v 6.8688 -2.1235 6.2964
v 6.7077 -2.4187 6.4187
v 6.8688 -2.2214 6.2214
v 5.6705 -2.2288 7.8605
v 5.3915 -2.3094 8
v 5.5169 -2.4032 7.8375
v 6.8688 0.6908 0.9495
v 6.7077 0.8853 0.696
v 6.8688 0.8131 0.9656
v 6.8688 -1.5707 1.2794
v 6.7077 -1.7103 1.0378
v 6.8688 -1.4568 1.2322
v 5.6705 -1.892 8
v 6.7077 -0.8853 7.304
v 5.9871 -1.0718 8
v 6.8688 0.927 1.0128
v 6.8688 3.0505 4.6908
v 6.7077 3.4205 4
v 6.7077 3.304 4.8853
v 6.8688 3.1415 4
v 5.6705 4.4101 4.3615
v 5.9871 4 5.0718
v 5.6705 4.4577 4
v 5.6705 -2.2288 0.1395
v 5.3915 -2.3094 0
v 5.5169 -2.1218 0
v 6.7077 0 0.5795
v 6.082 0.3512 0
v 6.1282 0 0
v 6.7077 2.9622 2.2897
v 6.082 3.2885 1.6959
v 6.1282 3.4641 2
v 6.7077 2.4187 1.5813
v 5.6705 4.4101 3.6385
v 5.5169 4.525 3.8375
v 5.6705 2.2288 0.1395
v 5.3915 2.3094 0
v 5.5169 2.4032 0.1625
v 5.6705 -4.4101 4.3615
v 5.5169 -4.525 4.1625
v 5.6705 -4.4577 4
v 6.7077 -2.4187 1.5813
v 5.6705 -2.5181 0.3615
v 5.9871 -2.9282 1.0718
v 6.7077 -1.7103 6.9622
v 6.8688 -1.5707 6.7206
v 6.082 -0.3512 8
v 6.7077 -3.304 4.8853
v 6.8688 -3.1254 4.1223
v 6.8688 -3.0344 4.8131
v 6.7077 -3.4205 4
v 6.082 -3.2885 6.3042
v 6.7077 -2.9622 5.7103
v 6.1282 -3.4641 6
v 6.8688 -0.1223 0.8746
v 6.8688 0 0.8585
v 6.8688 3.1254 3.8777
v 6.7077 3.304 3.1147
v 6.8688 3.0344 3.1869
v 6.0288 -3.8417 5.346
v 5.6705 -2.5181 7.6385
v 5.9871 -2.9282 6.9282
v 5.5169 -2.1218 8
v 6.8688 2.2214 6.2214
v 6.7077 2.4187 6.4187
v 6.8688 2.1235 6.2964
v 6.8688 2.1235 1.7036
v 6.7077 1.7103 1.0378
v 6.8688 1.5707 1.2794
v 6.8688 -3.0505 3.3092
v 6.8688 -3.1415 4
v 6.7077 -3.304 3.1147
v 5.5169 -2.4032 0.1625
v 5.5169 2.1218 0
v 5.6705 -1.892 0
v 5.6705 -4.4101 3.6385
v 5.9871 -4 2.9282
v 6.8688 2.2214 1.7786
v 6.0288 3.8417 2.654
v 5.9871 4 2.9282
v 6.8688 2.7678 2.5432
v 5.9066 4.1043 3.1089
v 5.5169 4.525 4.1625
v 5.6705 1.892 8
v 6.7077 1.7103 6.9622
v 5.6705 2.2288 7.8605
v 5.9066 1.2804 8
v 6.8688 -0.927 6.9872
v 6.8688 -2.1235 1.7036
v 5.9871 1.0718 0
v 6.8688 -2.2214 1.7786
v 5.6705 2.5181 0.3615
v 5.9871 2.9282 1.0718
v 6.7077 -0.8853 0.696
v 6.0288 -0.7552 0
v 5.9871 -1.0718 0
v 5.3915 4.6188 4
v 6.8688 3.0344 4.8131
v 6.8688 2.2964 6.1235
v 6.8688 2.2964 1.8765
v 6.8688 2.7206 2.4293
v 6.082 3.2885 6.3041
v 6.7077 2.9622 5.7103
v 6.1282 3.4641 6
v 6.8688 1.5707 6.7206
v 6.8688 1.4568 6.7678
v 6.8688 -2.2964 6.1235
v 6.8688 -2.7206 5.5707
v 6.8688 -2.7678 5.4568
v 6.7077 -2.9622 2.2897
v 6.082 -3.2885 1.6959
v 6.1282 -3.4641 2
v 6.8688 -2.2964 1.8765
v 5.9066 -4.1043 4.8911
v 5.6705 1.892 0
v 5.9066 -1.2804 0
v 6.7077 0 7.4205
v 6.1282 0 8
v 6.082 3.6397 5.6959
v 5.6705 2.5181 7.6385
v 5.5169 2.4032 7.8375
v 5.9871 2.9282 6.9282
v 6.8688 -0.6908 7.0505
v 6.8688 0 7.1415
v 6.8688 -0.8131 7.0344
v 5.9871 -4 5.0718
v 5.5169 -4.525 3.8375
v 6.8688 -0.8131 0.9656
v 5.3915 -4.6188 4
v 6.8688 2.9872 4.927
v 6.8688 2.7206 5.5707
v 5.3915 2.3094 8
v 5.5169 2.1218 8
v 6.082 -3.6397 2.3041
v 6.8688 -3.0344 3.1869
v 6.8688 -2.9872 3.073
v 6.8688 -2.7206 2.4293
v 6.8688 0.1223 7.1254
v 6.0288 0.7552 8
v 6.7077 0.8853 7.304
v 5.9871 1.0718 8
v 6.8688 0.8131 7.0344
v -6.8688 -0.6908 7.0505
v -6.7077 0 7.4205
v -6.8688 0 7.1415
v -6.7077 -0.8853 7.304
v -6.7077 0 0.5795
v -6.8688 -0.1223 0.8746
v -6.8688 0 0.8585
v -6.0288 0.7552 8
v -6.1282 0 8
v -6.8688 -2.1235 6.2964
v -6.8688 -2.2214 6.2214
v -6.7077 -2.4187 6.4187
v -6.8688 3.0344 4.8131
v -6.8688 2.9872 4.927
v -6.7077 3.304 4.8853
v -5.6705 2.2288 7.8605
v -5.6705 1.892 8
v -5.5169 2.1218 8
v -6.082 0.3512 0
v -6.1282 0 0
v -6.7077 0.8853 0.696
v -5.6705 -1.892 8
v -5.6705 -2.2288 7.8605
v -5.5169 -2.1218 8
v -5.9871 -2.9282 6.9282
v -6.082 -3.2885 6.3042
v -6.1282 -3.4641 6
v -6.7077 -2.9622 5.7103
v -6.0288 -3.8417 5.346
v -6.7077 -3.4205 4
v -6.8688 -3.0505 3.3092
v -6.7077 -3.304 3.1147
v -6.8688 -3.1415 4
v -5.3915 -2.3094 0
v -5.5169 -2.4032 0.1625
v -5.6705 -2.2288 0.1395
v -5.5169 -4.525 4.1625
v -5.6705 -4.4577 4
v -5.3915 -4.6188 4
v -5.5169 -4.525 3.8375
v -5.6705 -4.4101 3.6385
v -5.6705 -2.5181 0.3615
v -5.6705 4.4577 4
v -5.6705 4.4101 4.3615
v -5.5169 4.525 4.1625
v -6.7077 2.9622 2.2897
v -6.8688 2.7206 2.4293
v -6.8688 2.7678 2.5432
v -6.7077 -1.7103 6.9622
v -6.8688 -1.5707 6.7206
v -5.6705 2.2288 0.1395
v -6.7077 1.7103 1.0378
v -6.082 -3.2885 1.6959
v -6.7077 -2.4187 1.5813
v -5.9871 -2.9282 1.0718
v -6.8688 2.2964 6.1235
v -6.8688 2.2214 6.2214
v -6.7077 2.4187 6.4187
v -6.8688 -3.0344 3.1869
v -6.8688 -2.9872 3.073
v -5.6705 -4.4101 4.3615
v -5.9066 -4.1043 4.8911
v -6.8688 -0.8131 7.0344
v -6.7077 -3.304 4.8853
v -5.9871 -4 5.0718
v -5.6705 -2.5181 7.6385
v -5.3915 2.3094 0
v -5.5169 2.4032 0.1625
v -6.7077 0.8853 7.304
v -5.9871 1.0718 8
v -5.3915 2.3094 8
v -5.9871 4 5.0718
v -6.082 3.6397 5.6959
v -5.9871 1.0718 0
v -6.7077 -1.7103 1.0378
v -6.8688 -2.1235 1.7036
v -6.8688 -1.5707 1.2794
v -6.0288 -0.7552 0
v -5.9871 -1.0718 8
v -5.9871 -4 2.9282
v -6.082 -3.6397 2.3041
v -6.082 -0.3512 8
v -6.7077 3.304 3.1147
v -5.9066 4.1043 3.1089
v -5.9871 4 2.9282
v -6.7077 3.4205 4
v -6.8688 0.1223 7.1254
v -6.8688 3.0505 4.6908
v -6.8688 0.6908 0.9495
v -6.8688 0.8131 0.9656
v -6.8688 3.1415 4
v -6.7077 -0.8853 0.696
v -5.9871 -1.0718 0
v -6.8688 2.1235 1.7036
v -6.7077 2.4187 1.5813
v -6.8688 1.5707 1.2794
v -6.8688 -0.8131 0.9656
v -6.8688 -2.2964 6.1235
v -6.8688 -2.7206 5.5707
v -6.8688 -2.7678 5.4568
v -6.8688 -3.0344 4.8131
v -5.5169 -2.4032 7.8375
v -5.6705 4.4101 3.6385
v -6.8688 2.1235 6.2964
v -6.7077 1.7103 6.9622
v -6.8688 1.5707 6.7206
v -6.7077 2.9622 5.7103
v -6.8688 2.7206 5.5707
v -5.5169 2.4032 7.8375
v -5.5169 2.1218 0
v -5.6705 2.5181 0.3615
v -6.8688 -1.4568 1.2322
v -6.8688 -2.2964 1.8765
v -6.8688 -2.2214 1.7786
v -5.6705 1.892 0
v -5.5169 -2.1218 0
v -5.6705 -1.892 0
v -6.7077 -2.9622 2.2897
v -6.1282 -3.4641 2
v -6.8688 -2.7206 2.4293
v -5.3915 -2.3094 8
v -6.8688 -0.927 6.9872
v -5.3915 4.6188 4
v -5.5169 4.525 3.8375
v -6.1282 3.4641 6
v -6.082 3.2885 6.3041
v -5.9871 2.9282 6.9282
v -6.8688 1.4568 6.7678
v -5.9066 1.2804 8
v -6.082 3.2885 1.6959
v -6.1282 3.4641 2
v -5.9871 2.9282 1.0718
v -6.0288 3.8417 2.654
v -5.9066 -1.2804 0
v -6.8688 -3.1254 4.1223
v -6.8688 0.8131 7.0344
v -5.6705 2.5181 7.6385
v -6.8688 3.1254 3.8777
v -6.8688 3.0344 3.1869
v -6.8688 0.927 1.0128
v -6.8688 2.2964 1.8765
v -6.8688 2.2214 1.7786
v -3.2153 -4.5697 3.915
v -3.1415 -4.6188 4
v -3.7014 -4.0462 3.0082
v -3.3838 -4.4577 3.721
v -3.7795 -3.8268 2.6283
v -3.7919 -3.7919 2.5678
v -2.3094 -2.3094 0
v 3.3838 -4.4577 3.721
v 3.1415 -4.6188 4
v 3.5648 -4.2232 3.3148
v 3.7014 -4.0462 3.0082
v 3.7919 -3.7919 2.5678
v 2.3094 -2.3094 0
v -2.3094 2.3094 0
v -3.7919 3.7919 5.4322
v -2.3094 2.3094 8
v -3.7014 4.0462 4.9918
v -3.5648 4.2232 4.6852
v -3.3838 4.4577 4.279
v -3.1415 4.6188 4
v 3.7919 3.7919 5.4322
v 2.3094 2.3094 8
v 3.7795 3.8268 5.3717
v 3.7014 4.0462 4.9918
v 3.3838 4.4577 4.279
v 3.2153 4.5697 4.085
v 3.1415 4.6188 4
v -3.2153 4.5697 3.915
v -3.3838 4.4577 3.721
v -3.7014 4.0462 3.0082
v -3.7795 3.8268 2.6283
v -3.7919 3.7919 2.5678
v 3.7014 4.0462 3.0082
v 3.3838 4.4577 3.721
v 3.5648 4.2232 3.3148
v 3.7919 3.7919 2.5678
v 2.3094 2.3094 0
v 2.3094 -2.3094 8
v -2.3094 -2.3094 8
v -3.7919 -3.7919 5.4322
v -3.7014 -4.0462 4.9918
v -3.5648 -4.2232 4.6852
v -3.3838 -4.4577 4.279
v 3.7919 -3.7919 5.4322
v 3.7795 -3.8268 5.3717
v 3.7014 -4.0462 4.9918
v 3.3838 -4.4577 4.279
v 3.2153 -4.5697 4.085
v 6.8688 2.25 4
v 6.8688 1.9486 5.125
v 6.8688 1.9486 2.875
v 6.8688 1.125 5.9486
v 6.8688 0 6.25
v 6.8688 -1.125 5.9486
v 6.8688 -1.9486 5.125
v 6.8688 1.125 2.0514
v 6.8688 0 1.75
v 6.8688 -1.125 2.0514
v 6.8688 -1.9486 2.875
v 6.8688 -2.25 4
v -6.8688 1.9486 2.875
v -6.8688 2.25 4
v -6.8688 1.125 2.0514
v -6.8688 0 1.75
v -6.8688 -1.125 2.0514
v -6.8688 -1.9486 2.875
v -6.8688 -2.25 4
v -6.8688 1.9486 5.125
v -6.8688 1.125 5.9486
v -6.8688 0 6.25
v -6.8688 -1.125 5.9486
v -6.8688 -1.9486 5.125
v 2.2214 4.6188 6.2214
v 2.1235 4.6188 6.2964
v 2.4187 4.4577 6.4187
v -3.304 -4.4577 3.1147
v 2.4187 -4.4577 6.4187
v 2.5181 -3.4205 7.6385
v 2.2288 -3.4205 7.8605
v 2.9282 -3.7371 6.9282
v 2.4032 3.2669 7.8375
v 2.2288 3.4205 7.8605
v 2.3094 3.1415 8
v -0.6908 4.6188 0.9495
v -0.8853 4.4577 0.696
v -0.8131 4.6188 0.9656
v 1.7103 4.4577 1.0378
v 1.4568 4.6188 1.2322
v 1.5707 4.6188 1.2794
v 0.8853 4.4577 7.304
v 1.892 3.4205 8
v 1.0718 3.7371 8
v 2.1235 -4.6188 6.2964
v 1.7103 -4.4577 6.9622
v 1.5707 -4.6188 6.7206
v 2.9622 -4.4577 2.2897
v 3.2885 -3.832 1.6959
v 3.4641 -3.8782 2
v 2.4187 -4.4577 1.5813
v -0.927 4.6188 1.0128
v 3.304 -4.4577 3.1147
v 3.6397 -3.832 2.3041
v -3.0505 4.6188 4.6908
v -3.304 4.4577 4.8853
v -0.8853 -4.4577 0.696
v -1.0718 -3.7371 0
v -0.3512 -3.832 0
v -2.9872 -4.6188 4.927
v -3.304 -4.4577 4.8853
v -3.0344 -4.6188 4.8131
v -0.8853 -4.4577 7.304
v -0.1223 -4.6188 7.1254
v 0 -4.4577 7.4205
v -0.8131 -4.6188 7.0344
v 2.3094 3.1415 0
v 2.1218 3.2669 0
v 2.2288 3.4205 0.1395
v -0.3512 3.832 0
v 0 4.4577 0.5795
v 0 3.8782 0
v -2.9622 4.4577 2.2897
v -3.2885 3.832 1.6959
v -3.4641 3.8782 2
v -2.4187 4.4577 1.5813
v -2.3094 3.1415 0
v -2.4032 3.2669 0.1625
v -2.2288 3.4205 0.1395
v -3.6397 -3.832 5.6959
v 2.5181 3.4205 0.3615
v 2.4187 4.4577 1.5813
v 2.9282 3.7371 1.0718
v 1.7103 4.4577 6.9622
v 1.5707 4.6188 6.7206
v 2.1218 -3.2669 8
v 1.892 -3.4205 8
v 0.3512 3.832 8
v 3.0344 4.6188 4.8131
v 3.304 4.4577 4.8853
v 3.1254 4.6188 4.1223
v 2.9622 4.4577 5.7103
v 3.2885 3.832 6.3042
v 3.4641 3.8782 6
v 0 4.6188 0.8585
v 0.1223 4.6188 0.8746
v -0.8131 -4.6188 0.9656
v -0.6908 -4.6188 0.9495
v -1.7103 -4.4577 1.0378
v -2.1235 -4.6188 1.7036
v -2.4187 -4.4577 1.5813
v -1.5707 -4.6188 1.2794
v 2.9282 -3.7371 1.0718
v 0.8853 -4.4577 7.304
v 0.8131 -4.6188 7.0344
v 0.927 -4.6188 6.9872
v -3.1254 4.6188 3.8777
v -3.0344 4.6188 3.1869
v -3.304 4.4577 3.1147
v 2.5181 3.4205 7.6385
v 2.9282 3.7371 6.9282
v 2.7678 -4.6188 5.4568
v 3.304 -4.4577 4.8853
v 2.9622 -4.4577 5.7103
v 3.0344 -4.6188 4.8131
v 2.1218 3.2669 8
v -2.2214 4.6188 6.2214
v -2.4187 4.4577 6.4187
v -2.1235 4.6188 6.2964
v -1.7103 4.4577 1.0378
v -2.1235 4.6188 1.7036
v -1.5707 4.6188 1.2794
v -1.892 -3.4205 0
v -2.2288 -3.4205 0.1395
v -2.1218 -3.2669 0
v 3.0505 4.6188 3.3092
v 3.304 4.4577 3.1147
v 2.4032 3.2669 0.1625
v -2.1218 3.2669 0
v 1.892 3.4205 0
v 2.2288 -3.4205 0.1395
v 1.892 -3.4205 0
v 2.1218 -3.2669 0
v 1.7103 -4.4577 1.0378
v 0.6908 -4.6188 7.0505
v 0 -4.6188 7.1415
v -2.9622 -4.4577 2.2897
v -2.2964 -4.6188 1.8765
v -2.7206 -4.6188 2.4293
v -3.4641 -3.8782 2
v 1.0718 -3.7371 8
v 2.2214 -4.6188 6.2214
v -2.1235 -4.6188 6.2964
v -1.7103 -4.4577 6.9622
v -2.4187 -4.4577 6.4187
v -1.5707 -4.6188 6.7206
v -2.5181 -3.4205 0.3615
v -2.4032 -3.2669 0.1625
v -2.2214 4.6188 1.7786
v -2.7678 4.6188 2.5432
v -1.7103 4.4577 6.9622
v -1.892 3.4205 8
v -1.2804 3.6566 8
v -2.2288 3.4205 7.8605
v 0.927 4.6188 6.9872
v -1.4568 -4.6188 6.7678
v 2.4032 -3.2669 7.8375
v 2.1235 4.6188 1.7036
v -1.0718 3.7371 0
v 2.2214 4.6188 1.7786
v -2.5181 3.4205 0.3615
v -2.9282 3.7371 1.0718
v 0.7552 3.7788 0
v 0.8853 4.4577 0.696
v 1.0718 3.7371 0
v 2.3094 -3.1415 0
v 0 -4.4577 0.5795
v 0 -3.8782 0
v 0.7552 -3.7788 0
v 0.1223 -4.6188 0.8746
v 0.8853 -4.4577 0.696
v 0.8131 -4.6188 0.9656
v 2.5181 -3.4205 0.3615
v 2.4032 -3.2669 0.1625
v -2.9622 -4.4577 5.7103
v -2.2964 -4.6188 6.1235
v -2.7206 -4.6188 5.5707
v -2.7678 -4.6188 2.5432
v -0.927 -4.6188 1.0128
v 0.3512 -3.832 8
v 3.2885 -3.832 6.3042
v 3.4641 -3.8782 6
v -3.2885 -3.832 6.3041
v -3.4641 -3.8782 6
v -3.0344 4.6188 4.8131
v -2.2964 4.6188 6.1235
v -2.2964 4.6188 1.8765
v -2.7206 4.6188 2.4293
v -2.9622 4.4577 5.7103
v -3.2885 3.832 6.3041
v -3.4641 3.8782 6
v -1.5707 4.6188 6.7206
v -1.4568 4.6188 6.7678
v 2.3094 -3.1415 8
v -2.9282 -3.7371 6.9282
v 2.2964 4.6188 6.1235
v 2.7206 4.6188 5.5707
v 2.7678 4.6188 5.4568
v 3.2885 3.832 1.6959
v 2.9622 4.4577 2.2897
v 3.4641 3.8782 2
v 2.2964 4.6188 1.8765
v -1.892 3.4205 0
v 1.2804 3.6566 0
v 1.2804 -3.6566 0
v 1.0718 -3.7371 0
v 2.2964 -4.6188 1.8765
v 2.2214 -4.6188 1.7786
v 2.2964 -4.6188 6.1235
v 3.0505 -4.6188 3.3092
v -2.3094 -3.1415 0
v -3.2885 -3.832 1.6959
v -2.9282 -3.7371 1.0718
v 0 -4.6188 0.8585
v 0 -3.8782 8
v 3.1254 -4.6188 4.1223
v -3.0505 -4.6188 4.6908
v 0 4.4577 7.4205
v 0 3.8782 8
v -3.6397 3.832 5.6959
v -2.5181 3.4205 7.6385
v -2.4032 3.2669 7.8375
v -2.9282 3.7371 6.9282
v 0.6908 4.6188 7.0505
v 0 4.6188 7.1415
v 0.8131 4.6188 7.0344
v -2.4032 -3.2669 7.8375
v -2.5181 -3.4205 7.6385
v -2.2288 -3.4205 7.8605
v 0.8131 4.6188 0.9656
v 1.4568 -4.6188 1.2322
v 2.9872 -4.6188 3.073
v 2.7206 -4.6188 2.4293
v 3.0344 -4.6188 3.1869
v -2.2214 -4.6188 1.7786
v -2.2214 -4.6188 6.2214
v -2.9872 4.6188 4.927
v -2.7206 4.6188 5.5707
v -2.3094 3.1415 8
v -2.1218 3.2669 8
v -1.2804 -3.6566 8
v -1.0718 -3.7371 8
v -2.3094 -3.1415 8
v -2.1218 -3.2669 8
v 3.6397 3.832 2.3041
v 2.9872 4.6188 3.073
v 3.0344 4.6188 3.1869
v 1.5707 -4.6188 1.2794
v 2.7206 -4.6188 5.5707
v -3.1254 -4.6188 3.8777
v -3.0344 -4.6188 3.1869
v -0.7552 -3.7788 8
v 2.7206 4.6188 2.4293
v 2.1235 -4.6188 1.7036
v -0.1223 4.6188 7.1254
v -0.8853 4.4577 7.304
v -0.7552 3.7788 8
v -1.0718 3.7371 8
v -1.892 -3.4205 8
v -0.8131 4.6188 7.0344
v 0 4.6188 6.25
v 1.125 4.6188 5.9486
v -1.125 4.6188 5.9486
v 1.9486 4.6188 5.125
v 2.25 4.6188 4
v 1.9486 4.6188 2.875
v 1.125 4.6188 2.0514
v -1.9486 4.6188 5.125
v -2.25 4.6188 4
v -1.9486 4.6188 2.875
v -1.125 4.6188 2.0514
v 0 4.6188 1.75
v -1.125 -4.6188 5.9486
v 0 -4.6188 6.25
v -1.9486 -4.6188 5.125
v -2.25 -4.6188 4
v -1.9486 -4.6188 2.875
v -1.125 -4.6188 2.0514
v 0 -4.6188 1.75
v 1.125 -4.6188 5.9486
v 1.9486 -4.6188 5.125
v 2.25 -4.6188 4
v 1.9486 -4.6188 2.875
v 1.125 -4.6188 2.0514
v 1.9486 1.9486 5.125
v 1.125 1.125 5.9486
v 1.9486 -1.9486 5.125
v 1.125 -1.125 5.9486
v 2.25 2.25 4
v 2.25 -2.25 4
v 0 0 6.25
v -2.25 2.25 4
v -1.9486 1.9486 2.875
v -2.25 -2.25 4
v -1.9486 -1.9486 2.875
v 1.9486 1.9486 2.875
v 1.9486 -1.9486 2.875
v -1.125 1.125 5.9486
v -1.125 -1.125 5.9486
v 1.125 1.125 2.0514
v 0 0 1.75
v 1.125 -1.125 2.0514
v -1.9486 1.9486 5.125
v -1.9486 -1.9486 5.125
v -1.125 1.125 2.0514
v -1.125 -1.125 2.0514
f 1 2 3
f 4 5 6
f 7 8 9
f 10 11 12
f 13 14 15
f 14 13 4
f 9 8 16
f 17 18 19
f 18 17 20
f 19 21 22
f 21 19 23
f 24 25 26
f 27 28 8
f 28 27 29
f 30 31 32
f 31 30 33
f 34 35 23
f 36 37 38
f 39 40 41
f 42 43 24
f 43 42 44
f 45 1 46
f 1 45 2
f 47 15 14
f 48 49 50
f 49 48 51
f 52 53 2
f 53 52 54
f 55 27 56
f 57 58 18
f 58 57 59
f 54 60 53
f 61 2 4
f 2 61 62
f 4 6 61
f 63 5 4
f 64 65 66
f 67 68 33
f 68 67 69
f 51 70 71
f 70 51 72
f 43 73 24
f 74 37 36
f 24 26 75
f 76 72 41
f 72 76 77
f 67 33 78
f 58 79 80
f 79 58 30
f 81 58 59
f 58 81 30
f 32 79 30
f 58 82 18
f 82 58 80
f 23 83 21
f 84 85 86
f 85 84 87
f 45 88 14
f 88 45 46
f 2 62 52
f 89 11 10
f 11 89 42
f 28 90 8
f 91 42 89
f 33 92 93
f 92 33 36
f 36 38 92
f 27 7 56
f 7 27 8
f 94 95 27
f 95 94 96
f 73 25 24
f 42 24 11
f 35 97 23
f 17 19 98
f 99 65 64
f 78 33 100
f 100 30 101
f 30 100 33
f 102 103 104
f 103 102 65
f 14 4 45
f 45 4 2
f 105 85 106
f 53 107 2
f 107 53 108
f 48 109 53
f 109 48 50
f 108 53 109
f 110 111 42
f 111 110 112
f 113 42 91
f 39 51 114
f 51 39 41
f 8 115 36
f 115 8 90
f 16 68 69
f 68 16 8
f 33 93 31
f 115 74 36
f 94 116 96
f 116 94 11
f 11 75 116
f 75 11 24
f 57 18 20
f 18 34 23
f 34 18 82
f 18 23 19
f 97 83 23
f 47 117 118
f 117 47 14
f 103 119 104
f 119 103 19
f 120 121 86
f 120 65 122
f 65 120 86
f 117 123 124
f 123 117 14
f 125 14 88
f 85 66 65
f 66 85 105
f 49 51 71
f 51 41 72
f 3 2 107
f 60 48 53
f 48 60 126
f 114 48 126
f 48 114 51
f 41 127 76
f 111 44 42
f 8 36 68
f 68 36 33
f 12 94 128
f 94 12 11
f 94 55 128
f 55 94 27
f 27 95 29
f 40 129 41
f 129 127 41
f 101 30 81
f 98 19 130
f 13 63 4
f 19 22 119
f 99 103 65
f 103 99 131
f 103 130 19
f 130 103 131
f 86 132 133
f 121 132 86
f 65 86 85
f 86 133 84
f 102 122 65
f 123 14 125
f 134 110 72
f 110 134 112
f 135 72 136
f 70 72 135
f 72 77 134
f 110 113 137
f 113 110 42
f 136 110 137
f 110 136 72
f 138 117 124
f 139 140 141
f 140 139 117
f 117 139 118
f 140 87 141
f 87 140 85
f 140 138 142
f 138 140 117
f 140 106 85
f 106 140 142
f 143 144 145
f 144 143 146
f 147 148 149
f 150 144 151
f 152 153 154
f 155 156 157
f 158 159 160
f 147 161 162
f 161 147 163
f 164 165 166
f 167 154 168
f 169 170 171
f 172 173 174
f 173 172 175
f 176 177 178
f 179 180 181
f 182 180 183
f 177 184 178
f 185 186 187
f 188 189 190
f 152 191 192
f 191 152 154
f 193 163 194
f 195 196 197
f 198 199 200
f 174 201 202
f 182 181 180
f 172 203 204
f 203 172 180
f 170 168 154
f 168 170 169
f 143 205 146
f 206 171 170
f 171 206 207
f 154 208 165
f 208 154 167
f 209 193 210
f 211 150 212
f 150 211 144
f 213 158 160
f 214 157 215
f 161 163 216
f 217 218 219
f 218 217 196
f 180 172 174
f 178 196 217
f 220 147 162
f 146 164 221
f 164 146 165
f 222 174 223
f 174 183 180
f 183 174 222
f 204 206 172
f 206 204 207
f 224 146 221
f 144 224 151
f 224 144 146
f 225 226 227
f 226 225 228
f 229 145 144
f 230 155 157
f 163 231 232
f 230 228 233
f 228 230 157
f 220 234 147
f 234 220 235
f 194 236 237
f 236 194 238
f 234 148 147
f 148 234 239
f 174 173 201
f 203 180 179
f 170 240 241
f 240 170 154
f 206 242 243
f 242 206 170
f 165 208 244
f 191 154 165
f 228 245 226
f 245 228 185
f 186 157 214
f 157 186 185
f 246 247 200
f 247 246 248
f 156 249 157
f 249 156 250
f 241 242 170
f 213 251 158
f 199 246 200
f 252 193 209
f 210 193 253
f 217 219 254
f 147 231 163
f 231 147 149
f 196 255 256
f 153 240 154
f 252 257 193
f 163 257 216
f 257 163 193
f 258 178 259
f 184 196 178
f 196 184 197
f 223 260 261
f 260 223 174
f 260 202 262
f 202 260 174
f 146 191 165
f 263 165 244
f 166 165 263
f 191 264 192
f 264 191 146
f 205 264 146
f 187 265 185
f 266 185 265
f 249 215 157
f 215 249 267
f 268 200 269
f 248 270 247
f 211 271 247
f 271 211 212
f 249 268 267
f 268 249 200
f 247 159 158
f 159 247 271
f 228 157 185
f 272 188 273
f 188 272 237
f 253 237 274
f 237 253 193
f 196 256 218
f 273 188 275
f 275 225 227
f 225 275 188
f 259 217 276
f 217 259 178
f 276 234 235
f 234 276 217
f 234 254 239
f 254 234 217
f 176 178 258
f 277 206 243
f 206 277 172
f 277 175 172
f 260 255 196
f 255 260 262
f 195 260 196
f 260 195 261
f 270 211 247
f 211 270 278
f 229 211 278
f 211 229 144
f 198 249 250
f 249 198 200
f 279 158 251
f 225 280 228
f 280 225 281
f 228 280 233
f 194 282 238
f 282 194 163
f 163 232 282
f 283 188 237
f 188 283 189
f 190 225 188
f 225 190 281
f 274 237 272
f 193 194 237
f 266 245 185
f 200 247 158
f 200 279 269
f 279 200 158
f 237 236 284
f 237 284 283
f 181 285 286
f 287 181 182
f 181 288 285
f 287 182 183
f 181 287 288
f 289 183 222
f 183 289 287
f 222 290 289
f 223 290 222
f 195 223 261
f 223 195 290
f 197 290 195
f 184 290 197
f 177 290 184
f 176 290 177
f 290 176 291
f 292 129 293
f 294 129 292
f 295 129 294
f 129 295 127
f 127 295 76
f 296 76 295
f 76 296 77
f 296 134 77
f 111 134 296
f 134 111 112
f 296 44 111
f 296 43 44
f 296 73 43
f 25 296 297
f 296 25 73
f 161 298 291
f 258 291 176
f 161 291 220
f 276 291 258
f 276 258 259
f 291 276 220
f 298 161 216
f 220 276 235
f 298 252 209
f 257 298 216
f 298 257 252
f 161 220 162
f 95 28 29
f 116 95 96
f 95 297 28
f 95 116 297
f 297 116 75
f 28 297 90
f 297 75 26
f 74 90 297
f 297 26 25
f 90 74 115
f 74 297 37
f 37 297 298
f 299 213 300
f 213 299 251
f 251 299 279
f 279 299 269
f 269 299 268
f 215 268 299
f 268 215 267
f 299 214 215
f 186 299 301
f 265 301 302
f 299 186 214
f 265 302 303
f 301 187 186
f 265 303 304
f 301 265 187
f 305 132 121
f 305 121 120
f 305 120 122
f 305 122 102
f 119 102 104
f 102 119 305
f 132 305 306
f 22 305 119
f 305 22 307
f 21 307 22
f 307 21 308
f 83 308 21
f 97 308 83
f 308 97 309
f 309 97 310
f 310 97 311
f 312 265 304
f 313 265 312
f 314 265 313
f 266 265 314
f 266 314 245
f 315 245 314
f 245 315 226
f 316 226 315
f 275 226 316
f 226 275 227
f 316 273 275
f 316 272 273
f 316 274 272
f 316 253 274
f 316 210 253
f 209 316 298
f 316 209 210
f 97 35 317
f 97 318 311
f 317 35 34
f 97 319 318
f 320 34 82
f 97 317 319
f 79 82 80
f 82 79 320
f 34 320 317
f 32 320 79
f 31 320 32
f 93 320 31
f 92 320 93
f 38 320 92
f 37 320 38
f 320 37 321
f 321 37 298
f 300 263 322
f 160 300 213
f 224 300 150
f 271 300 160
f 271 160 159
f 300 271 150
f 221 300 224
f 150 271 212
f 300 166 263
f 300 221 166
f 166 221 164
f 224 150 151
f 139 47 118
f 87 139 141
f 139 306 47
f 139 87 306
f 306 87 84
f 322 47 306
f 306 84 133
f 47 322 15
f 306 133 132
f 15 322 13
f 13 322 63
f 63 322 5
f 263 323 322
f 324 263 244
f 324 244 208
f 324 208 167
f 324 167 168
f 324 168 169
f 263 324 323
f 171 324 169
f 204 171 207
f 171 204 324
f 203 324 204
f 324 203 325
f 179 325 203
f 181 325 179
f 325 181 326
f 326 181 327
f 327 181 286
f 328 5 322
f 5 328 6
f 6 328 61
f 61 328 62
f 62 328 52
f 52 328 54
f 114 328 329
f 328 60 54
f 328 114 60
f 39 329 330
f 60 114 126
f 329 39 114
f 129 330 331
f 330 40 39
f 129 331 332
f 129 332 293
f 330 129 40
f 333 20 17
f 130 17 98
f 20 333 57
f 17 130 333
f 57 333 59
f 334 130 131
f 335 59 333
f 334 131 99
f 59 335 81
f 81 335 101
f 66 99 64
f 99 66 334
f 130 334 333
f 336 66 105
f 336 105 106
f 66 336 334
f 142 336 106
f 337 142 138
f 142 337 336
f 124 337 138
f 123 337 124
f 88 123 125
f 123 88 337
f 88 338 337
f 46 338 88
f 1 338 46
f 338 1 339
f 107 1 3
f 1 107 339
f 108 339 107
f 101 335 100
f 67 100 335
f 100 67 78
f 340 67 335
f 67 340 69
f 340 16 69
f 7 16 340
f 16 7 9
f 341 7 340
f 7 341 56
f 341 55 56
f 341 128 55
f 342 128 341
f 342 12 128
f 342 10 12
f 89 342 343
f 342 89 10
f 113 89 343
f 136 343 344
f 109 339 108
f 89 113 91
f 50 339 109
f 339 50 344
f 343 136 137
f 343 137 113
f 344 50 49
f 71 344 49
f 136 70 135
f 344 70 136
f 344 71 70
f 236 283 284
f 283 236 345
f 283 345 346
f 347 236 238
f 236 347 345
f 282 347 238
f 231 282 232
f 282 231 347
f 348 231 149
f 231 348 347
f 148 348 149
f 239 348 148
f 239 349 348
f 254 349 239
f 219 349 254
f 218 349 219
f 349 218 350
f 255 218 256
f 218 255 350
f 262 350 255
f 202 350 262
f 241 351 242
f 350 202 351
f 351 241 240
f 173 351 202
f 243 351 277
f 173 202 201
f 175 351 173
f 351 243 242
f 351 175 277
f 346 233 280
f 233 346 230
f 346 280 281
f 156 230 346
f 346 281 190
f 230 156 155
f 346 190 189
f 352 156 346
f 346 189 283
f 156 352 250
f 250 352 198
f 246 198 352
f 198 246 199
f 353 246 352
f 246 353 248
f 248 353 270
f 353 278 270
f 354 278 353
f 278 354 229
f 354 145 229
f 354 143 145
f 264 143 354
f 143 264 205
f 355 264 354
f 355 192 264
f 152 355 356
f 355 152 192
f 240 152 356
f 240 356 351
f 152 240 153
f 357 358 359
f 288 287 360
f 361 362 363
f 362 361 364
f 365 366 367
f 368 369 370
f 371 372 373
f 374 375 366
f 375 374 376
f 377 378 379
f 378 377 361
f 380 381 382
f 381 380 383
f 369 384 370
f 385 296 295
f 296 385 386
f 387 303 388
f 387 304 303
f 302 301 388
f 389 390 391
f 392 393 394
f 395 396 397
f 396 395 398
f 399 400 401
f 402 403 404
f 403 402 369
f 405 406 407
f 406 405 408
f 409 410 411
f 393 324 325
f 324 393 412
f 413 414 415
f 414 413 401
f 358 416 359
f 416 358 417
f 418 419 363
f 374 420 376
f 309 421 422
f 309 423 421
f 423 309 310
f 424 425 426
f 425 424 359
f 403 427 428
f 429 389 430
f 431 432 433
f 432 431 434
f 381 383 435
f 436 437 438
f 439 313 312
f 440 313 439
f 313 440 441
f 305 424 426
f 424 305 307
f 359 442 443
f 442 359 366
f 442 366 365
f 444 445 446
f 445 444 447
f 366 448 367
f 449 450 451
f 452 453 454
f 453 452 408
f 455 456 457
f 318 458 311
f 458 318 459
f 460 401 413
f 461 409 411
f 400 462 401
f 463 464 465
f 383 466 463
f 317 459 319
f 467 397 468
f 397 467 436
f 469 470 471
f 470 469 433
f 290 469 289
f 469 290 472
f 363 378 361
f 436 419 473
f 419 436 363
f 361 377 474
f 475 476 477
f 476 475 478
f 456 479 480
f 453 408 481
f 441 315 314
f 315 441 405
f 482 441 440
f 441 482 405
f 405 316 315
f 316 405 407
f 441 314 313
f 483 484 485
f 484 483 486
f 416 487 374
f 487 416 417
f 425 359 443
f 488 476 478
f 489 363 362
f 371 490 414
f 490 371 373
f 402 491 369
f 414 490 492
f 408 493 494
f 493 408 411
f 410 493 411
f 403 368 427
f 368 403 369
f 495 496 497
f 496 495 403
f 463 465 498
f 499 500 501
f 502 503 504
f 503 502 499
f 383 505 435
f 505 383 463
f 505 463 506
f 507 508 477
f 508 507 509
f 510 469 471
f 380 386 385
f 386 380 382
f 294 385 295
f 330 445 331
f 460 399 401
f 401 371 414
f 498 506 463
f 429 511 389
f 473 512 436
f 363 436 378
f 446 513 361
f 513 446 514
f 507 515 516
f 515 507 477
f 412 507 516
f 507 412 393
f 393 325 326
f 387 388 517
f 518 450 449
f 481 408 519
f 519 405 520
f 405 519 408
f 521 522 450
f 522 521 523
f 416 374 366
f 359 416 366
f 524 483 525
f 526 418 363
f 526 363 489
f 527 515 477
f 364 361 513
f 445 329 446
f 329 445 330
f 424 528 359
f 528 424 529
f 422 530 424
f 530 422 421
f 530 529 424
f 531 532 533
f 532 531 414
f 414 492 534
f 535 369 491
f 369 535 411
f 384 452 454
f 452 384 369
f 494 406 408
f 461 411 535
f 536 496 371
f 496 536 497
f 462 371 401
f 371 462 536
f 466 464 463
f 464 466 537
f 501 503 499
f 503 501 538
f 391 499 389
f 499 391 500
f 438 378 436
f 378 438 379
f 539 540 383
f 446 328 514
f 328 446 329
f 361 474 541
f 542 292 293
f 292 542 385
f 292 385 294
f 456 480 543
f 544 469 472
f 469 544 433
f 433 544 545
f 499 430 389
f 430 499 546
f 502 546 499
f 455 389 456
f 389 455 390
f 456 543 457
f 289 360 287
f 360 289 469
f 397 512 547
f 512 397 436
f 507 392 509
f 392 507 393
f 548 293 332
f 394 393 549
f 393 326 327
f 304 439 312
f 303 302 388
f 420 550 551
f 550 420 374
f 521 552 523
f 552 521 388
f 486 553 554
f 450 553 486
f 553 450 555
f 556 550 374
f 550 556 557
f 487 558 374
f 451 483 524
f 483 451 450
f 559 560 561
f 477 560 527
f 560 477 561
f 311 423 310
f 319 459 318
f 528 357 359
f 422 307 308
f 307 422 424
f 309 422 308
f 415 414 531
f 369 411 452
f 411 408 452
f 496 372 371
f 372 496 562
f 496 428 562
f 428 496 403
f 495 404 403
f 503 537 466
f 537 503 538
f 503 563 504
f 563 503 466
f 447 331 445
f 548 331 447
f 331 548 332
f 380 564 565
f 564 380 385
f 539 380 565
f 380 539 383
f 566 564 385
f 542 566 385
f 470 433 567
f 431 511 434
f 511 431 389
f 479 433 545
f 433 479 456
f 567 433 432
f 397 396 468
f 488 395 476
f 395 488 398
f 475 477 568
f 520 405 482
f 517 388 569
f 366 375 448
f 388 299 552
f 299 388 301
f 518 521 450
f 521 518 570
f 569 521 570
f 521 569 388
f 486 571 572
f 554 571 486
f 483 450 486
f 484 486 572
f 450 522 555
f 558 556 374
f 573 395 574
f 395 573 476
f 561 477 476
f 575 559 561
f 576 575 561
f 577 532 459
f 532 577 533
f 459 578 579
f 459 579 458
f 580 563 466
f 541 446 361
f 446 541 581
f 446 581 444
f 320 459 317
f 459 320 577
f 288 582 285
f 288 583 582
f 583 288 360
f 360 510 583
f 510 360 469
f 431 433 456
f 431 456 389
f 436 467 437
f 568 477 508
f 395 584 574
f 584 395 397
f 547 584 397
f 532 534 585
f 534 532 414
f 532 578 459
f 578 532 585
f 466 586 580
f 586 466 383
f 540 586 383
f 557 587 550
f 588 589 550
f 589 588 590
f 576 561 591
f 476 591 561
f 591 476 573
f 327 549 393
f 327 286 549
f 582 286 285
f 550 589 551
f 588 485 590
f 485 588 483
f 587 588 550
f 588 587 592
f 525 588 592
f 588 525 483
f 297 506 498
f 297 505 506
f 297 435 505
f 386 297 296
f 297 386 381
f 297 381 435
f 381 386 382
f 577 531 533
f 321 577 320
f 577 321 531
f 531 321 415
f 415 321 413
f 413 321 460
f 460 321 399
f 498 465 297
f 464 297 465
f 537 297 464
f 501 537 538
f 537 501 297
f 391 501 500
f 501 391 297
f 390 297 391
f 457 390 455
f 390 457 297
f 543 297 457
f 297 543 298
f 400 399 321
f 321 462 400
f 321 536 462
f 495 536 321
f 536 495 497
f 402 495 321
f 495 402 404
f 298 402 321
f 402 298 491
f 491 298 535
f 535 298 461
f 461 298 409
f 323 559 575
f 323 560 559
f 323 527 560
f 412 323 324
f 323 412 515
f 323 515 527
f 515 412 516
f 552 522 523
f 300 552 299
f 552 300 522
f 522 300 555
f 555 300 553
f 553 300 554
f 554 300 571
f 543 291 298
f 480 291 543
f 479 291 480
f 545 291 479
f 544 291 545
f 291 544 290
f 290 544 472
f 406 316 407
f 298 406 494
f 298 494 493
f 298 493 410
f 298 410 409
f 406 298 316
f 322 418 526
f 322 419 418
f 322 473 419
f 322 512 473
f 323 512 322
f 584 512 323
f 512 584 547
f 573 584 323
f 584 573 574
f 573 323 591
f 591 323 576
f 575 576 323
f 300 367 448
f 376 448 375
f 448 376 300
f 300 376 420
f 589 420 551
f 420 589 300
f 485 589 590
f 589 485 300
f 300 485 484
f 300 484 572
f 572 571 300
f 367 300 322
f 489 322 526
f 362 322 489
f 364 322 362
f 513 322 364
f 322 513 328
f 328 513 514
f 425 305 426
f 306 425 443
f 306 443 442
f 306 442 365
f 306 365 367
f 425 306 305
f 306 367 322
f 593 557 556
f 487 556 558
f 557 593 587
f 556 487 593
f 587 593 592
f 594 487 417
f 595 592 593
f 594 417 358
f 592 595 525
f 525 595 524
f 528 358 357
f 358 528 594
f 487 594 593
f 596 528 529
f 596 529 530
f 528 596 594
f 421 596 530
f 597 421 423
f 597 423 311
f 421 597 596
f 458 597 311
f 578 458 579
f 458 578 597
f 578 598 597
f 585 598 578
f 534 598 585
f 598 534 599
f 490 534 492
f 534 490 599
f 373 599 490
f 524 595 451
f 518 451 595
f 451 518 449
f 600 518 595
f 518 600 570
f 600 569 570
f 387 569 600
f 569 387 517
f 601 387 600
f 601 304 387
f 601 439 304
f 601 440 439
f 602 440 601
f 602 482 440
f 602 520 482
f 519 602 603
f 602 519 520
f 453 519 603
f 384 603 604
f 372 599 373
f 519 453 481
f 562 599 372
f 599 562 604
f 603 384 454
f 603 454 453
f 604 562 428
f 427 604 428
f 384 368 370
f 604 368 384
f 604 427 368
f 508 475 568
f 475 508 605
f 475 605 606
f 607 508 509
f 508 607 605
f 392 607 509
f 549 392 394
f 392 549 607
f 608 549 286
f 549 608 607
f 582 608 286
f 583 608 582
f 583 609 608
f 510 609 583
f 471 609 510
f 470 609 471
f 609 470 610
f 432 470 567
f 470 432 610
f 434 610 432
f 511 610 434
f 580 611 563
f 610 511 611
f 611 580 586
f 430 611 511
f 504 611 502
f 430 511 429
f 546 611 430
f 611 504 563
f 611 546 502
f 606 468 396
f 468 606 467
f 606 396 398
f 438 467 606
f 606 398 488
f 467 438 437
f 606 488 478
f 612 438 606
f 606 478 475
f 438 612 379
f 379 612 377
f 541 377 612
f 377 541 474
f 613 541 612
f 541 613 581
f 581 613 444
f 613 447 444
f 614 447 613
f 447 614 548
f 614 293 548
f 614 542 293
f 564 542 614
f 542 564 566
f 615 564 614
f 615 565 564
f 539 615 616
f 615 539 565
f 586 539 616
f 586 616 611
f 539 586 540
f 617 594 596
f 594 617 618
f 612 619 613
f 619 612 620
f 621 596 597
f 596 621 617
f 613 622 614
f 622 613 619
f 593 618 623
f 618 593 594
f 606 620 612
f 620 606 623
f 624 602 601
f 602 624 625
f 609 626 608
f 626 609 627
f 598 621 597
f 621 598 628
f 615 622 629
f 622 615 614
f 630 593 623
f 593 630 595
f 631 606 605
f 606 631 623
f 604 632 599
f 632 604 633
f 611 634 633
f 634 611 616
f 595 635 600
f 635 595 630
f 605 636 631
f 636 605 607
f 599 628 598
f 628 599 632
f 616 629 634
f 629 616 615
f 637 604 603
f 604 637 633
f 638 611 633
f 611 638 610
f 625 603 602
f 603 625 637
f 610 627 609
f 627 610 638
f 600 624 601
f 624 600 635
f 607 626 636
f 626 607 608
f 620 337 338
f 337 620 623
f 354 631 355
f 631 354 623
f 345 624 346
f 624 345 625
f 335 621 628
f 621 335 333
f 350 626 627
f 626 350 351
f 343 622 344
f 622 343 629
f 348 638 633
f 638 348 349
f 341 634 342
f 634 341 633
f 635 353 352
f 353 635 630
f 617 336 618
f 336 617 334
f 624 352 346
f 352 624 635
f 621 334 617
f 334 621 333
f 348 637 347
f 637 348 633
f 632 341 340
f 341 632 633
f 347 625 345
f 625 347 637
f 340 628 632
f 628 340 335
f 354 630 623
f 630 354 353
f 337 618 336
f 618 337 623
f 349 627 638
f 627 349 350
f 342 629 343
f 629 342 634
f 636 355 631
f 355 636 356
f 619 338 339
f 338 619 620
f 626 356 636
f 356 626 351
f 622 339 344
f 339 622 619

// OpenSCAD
// file: configuration.scad
rodSize  = 10;	//10 or 8; sets linear bearing size as well.
rodSeparation = 64;	//how far between rod centers
wall = 5;	//general wall thicknesses
boltSize = 4;	//3 for m3, 4 for m4
wingLength = rodSeparation;	//how long the wing supports are for the motor
				//and idler mounts.

//generic slop specs
rodSlop  = 1.0;	//how much bigger to make smooth rod holes
boltSlop = 0.5;	//how much bigger to make bolt holes
nutSlop  = 0.6;	//how much bigger to make nut holes
jointSlop = .5;	//how much space around the joint
			//the joint itself isn't slopped, the parts that join to it are.


//lm10uu specs
lm_dia = 20;
lm_height = 30;


//joint specs
tubeDia = 6;
jointHeight=boltSize*2;
jointInner=jointHeight / cos(30);  //small side of joint - clamped by the jaw
jointOuter=jointInner+boltSize+boltSlop;  //large side of joint, clamped by carriage & platform
jointSeparation=rodSeparation; //separation between rod centers - used to align carriage & platform


//platform specs
platform_thickness = wall*1.15;
platform_hinge_offset = 20;

//motor/idler specs
idlerShaft = 4.5;
motorShaft = 12.5;
motorMin = 12.5;
motorMax = 16.5;

tabGap = 1;
tabWidth = 6;


m8Dia = 8+boltSlop;
m8Rad = m8Dia/2;
m8NutDia = 15+nutSlop;
m8NutRad = m8NutDia/2;

nutDia = 8.1+nutSlop;
nutRad = nutDia/2;
boltDia = 4+boltSlop;
boltRad = boltDia/2;

m3NutDia = 6.1+nutSlop;
m3NutRad = m3NutDia/2;
m3BoltDia = 3+boltSlop;
m3BoltRad = m3BoltDia/2;
// main file
include <configuration.scad>

//limits - it should fit in this box :-)
%translate([-jointOuter/2,-jointInner/2,0])
cube([jointOuter, jointInner, jointHeight]);

translate([0,0,-.1])
%cube([200,200,0.2], center=true);

module stumpy(rad = 6, length = 5) {
  rotate([0, 90, 0]) rotate([0, 0, 30]) intersection() {
    cylinder(r=rad, h=length, center=true, $fn=6);
    union(){
      for(i=[0:1]){
        mirror([0,0,i])
        translate([0,0,length/2-rad])
        sphere(r=rad+1, $fn=24);
      }
    }
  }
}

module joint() {
  translate([0, 0, jointHeight/2])
  difference() {
    union() {
      stumpy(jointInner/2, jointOuter);
      rotate([0, 0, 90]) stumpy(jointInner/2, jointInner);
    }
    rotate([90, 0, 0]) cylinder(r=boltRad, h=30, center=true, $fn=12);
    rotate([0, 90, 0]) cylinder(r=boltRad, h=30, center=true, $fn=12);
  }
}

joint();
